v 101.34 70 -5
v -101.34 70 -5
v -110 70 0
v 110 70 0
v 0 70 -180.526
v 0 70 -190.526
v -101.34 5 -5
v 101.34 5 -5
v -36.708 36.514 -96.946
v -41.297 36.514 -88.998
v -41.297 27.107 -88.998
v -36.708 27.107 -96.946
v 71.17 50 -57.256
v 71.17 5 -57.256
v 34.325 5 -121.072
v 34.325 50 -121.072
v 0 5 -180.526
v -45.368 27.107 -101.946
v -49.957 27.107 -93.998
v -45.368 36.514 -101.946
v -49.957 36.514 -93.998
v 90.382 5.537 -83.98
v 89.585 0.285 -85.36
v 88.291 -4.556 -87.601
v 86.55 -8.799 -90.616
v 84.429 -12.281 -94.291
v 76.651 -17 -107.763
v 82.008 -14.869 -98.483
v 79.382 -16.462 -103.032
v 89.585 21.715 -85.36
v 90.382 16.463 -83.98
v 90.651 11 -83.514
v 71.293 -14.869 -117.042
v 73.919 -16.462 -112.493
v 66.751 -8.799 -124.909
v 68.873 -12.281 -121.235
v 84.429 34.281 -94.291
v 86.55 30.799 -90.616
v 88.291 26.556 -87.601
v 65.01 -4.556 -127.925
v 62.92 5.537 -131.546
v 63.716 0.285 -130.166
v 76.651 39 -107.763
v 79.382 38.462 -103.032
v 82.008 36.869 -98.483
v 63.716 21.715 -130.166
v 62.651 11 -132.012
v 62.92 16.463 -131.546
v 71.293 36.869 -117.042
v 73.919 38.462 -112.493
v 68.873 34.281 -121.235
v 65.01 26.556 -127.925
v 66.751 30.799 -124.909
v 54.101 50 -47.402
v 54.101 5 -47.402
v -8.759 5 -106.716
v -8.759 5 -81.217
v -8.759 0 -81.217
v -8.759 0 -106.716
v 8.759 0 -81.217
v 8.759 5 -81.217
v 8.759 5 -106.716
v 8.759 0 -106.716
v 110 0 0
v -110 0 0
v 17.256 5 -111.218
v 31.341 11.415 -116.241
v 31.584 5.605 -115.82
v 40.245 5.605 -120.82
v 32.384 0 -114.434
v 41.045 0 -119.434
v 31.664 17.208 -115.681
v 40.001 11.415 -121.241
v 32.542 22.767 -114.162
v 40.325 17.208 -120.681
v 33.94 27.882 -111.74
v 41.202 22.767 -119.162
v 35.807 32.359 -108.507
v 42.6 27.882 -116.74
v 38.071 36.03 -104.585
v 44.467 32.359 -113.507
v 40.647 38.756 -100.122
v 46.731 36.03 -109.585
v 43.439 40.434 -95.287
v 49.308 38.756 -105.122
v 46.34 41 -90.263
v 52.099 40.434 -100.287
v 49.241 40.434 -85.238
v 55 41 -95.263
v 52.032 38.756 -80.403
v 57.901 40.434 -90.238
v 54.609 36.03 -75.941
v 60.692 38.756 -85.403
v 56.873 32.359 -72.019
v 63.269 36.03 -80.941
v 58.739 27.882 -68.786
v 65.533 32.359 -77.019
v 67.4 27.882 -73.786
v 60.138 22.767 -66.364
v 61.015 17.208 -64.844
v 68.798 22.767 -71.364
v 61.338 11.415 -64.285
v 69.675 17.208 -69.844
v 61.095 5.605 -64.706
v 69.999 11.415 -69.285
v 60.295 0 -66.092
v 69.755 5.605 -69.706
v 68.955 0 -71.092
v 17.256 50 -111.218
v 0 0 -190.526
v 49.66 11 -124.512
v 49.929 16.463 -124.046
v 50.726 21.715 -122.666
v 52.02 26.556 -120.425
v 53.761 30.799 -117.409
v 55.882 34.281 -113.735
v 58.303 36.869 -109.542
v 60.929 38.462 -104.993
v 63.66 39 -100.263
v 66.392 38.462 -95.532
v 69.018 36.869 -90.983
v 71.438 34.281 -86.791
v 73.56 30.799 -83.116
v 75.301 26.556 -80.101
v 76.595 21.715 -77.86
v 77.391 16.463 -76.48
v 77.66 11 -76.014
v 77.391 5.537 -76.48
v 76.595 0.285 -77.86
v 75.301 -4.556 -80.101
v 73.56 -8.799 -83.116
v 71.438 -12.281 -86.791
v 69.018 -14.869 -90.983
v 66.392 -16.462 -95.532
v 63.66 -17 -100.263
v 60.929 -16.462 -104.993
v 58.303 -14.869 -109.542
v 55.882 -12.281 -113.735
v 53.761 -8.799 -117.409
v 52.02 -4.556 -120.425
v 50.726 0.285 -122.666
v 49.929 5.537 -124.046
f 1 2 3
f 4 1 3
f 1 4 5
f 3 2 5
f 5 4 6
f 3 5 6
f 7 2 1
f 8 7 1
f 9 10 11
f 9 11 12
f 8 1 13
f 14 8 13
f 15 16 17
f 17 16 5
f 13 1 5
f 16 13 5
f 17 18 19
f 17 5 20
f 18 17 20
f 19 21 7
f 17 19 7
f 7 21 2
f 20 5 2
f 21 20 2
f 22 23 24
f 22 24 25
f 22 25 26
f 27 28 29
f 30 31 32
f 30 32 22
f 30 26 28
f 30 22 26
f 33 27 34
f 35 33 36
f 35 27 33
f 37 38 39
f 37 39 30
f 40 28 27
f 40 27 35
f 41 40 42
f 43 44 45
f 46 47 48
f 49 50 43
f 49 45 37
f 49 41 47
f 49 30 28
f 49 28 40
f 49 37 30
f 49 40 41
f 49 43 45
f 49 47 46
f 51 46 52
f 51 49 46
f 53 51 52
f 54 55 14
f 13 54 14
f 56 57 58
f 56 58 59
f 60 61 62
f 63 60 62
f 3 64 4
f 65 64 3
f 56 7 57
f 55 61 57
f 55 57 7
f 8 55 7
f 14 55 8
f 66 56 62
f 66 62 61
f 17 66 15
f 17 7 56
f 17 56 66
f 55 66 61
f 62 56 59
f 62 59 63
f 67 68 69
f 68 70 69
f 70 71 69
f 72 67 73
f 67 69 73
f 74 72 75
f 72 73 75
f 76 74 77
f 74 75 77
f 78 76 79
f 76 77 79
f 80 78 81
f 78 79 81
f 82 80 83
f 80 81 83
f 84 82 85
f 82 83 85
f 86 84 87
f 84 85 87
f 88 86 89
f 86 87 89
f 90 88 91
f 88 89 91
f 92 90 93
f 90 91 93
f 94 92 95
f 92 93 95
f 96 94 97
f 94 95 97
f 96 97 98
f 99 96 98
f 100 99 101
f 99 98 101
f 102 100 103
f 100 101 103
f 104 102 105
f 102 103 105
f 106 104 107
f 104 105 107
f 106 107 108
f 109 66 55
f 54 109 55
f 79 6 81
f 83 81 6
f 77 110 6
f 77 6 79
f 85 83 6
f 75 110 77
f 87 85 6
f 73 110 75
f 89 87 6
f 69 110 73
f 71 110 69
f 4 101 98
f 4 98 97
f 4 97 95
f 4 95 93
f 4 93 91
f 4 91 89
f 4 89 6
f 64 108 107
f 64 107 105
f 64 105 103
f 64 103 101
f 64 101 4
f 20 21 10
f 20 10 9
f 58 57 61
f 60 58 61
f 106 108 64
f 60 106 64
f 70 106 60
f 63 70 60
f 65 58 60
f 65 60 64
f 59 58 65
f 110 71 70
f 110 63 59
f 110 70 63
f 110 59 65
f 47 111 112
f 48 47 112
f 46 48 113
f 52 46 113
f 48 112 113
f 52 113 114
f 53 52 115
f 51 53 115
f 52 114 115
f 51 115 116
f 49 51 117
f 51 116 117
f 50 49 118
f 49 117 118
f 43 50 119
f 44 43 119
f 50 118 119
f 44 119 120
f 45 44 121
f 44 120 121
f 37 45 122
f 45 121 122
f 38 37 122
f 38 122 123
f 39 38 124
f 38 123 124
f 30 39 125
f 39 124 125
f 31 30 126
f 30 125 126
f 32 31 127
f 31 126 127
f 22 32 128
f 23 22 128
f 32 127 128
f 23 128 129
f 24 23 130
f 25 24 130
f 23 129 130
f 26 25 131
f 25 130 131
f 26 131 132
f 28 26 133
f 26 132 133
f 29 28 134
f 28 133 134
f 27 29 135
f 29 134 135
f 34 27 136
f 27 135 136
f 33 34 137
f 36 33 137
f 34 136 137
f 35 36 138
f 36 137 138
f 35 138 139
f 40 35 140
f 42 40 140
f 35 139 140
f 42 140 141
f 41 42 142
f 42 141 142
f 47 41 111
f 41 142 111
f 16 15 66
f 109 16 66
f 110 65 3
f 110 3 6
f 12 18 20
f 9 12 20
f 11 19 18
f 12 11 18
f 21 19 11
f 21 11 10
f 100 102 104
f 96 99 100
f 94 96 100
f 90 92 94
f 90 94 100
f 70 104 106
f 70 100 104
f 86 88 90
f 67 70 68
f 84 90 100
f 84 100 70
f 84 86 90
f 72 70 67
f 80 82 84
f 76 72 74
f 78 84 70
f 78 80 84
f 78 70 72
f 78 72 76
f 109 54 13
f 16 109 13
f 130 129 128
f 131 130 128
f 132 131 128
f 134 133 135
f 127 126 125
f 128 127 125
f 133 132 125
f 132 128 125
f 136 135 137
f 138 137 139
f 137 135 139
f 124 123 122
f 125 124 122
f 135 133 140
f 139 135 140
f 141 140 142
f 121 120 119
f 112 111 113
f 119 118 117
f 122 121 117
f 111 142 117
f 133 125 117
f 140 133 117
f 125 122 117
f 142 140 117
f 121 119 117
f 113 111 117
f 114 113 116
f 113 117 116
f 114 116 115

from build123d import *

# Parameters (mm, degrees)
BOSS_EXTRUDE1_DEPTH = 70
CUT_EXTRUDE1_DEPTH  = 65
SKETCH3_R           = 28
BOSS_EXTRUDE2_DEPTH = 15
SKETCH4_R           = 2
CUT_EXTRUDE2_DEPTH  = 65
SKETCH5_W           = 17.517791656
SKETCH5_H           = 25.498705067
CUT_EXTRUDE3_DEPTH  = 65
SKETCH6_W           = 9.177614019
SKETCH6_H           = 9.406934548
BOSS_EXTRUDE3_DEPTH = 10
BOSS_EXTRUDE4_DEPTH = 45
SKETCH7_R           = 30
CUT_EXTRUDE4_DEPTH  = 10


with BuildPart() as part:
    # Sketch1 → Boss-Extrude1 (new body)
    with BuildSketch(Plane(origin=(0, 0, 0), x_dir=(1, 0, 0), z_dir=(0, 1, 0))):
        Polygon((110, 0), (-110, 0), (0, 190.525588833), align=None)
    extrude(amount=BOSS_EXTRUDE1_DEPTH)

    # Sketch2 → Cut-Extrude1 (cut)
    with BuildSketch(Plane(origin=(0, 70, 0), x_dir=(1, 0, 0), z_dir=(0, 1, 0))):
        Polygon((-101.339745962, 5), (101.339745962, 5), (0, 180.525588833), align=None)
    extrude(amount=-CUT_EXTRUDE1_DEPTH, mode=Mode.SUBTRACT)

    # Sketch4 → Cut-Extrude2 (cut)
    with BuildSketch(Plane(origin=(82.5, 0, -47.631397208), x_dir=(-0.5, 0, -0.8660254037844386), z_dir=(0.8660254037844387, 0, -0.5000000000000001))):
        with Locations((55, 11)):
            Circle(SKETCH4_R)
    extrude(amount=-CUT_EXTRUDE2_DEPTH, mode=Mode.SUBTRACT)

    # Sketch5 → Cut-Extrude3 (cut)
    with BuildSketch(Plane(origin=(0, 5, 0), x_dir=(1, 0, 0), z_dir=(0, 1, 0))):
        with Locations((0, 93.96640493)):
            Rectangle(SKETCH5_W, SKETCH5_H)
    extrude(amount=-CUT_EXTRUDE3_DEPTH, mode=Mode.SUBTRACT)

    # Sketch6 → Boss-Extrude3 (add)
    with BuildSketch(Plane(origin=(-78.169872981, 0, -45.131397208), x_dir=(0.49999999999999983, 0, -0.8660254037844387), z_dir=(0.8660254037844387, 0, 0.49999999999999983))):
        with Locations((61.014752259, 31.810852178)):
            Rectangle(SKETCH6_W, SKETCH6_H)
    extrude(amount=BOSS_EXTRUDE3_DEPTH)

    # Sketch8 → Boss-Extrude4 (add)
    with BuildSketch(Plane(origin=(0, 5, 0), x_dir=(1, 0, 0), z_dir=(0, 1, 0))):
        Polygon((71.169539548, 57.256330384), (34.325297845, 121.07242898), (17.256316286, 111.217647881), (54.100557988, 47.401549286), align=None)
    extrude(amount=BOSS_EXTRUDE4_DEPTH)

    # Sketch7 → Cut-Extrude4 (cut)
    with BuildSketch(Plane(origin=(82.5, 0, -47.631397208), x_dir=(-0.5, 0, -0.8660254037844386), z_dir=(0.8660254037844387, 0, -0.5000000000000001))):
        with Locations((55, 11)):
            Circle(SKETCH7_R)
    extrude(amount=-CUT_EXTRUDE4_DEPTH, mode=Mode.SUBTRACT)


with BuildPart() as body_2:
    # Sketch3 → Boss-Extrude2 (new body)
    with BuildSketch(Plane(origin=(91.160254038, 0, -52.631397208), x_dir=(-0.5, 0, -0.8660254037844386), z_dir=(0.8660254037844387, 0, -0.5000000000000001))):
        with Locations((55, 11)):
            Circle(SKETCH3_R)
    extrude(amount=BOSS_EXTRUDE2_DEPTH)


solid = Compound([part.part, body_2.part])
